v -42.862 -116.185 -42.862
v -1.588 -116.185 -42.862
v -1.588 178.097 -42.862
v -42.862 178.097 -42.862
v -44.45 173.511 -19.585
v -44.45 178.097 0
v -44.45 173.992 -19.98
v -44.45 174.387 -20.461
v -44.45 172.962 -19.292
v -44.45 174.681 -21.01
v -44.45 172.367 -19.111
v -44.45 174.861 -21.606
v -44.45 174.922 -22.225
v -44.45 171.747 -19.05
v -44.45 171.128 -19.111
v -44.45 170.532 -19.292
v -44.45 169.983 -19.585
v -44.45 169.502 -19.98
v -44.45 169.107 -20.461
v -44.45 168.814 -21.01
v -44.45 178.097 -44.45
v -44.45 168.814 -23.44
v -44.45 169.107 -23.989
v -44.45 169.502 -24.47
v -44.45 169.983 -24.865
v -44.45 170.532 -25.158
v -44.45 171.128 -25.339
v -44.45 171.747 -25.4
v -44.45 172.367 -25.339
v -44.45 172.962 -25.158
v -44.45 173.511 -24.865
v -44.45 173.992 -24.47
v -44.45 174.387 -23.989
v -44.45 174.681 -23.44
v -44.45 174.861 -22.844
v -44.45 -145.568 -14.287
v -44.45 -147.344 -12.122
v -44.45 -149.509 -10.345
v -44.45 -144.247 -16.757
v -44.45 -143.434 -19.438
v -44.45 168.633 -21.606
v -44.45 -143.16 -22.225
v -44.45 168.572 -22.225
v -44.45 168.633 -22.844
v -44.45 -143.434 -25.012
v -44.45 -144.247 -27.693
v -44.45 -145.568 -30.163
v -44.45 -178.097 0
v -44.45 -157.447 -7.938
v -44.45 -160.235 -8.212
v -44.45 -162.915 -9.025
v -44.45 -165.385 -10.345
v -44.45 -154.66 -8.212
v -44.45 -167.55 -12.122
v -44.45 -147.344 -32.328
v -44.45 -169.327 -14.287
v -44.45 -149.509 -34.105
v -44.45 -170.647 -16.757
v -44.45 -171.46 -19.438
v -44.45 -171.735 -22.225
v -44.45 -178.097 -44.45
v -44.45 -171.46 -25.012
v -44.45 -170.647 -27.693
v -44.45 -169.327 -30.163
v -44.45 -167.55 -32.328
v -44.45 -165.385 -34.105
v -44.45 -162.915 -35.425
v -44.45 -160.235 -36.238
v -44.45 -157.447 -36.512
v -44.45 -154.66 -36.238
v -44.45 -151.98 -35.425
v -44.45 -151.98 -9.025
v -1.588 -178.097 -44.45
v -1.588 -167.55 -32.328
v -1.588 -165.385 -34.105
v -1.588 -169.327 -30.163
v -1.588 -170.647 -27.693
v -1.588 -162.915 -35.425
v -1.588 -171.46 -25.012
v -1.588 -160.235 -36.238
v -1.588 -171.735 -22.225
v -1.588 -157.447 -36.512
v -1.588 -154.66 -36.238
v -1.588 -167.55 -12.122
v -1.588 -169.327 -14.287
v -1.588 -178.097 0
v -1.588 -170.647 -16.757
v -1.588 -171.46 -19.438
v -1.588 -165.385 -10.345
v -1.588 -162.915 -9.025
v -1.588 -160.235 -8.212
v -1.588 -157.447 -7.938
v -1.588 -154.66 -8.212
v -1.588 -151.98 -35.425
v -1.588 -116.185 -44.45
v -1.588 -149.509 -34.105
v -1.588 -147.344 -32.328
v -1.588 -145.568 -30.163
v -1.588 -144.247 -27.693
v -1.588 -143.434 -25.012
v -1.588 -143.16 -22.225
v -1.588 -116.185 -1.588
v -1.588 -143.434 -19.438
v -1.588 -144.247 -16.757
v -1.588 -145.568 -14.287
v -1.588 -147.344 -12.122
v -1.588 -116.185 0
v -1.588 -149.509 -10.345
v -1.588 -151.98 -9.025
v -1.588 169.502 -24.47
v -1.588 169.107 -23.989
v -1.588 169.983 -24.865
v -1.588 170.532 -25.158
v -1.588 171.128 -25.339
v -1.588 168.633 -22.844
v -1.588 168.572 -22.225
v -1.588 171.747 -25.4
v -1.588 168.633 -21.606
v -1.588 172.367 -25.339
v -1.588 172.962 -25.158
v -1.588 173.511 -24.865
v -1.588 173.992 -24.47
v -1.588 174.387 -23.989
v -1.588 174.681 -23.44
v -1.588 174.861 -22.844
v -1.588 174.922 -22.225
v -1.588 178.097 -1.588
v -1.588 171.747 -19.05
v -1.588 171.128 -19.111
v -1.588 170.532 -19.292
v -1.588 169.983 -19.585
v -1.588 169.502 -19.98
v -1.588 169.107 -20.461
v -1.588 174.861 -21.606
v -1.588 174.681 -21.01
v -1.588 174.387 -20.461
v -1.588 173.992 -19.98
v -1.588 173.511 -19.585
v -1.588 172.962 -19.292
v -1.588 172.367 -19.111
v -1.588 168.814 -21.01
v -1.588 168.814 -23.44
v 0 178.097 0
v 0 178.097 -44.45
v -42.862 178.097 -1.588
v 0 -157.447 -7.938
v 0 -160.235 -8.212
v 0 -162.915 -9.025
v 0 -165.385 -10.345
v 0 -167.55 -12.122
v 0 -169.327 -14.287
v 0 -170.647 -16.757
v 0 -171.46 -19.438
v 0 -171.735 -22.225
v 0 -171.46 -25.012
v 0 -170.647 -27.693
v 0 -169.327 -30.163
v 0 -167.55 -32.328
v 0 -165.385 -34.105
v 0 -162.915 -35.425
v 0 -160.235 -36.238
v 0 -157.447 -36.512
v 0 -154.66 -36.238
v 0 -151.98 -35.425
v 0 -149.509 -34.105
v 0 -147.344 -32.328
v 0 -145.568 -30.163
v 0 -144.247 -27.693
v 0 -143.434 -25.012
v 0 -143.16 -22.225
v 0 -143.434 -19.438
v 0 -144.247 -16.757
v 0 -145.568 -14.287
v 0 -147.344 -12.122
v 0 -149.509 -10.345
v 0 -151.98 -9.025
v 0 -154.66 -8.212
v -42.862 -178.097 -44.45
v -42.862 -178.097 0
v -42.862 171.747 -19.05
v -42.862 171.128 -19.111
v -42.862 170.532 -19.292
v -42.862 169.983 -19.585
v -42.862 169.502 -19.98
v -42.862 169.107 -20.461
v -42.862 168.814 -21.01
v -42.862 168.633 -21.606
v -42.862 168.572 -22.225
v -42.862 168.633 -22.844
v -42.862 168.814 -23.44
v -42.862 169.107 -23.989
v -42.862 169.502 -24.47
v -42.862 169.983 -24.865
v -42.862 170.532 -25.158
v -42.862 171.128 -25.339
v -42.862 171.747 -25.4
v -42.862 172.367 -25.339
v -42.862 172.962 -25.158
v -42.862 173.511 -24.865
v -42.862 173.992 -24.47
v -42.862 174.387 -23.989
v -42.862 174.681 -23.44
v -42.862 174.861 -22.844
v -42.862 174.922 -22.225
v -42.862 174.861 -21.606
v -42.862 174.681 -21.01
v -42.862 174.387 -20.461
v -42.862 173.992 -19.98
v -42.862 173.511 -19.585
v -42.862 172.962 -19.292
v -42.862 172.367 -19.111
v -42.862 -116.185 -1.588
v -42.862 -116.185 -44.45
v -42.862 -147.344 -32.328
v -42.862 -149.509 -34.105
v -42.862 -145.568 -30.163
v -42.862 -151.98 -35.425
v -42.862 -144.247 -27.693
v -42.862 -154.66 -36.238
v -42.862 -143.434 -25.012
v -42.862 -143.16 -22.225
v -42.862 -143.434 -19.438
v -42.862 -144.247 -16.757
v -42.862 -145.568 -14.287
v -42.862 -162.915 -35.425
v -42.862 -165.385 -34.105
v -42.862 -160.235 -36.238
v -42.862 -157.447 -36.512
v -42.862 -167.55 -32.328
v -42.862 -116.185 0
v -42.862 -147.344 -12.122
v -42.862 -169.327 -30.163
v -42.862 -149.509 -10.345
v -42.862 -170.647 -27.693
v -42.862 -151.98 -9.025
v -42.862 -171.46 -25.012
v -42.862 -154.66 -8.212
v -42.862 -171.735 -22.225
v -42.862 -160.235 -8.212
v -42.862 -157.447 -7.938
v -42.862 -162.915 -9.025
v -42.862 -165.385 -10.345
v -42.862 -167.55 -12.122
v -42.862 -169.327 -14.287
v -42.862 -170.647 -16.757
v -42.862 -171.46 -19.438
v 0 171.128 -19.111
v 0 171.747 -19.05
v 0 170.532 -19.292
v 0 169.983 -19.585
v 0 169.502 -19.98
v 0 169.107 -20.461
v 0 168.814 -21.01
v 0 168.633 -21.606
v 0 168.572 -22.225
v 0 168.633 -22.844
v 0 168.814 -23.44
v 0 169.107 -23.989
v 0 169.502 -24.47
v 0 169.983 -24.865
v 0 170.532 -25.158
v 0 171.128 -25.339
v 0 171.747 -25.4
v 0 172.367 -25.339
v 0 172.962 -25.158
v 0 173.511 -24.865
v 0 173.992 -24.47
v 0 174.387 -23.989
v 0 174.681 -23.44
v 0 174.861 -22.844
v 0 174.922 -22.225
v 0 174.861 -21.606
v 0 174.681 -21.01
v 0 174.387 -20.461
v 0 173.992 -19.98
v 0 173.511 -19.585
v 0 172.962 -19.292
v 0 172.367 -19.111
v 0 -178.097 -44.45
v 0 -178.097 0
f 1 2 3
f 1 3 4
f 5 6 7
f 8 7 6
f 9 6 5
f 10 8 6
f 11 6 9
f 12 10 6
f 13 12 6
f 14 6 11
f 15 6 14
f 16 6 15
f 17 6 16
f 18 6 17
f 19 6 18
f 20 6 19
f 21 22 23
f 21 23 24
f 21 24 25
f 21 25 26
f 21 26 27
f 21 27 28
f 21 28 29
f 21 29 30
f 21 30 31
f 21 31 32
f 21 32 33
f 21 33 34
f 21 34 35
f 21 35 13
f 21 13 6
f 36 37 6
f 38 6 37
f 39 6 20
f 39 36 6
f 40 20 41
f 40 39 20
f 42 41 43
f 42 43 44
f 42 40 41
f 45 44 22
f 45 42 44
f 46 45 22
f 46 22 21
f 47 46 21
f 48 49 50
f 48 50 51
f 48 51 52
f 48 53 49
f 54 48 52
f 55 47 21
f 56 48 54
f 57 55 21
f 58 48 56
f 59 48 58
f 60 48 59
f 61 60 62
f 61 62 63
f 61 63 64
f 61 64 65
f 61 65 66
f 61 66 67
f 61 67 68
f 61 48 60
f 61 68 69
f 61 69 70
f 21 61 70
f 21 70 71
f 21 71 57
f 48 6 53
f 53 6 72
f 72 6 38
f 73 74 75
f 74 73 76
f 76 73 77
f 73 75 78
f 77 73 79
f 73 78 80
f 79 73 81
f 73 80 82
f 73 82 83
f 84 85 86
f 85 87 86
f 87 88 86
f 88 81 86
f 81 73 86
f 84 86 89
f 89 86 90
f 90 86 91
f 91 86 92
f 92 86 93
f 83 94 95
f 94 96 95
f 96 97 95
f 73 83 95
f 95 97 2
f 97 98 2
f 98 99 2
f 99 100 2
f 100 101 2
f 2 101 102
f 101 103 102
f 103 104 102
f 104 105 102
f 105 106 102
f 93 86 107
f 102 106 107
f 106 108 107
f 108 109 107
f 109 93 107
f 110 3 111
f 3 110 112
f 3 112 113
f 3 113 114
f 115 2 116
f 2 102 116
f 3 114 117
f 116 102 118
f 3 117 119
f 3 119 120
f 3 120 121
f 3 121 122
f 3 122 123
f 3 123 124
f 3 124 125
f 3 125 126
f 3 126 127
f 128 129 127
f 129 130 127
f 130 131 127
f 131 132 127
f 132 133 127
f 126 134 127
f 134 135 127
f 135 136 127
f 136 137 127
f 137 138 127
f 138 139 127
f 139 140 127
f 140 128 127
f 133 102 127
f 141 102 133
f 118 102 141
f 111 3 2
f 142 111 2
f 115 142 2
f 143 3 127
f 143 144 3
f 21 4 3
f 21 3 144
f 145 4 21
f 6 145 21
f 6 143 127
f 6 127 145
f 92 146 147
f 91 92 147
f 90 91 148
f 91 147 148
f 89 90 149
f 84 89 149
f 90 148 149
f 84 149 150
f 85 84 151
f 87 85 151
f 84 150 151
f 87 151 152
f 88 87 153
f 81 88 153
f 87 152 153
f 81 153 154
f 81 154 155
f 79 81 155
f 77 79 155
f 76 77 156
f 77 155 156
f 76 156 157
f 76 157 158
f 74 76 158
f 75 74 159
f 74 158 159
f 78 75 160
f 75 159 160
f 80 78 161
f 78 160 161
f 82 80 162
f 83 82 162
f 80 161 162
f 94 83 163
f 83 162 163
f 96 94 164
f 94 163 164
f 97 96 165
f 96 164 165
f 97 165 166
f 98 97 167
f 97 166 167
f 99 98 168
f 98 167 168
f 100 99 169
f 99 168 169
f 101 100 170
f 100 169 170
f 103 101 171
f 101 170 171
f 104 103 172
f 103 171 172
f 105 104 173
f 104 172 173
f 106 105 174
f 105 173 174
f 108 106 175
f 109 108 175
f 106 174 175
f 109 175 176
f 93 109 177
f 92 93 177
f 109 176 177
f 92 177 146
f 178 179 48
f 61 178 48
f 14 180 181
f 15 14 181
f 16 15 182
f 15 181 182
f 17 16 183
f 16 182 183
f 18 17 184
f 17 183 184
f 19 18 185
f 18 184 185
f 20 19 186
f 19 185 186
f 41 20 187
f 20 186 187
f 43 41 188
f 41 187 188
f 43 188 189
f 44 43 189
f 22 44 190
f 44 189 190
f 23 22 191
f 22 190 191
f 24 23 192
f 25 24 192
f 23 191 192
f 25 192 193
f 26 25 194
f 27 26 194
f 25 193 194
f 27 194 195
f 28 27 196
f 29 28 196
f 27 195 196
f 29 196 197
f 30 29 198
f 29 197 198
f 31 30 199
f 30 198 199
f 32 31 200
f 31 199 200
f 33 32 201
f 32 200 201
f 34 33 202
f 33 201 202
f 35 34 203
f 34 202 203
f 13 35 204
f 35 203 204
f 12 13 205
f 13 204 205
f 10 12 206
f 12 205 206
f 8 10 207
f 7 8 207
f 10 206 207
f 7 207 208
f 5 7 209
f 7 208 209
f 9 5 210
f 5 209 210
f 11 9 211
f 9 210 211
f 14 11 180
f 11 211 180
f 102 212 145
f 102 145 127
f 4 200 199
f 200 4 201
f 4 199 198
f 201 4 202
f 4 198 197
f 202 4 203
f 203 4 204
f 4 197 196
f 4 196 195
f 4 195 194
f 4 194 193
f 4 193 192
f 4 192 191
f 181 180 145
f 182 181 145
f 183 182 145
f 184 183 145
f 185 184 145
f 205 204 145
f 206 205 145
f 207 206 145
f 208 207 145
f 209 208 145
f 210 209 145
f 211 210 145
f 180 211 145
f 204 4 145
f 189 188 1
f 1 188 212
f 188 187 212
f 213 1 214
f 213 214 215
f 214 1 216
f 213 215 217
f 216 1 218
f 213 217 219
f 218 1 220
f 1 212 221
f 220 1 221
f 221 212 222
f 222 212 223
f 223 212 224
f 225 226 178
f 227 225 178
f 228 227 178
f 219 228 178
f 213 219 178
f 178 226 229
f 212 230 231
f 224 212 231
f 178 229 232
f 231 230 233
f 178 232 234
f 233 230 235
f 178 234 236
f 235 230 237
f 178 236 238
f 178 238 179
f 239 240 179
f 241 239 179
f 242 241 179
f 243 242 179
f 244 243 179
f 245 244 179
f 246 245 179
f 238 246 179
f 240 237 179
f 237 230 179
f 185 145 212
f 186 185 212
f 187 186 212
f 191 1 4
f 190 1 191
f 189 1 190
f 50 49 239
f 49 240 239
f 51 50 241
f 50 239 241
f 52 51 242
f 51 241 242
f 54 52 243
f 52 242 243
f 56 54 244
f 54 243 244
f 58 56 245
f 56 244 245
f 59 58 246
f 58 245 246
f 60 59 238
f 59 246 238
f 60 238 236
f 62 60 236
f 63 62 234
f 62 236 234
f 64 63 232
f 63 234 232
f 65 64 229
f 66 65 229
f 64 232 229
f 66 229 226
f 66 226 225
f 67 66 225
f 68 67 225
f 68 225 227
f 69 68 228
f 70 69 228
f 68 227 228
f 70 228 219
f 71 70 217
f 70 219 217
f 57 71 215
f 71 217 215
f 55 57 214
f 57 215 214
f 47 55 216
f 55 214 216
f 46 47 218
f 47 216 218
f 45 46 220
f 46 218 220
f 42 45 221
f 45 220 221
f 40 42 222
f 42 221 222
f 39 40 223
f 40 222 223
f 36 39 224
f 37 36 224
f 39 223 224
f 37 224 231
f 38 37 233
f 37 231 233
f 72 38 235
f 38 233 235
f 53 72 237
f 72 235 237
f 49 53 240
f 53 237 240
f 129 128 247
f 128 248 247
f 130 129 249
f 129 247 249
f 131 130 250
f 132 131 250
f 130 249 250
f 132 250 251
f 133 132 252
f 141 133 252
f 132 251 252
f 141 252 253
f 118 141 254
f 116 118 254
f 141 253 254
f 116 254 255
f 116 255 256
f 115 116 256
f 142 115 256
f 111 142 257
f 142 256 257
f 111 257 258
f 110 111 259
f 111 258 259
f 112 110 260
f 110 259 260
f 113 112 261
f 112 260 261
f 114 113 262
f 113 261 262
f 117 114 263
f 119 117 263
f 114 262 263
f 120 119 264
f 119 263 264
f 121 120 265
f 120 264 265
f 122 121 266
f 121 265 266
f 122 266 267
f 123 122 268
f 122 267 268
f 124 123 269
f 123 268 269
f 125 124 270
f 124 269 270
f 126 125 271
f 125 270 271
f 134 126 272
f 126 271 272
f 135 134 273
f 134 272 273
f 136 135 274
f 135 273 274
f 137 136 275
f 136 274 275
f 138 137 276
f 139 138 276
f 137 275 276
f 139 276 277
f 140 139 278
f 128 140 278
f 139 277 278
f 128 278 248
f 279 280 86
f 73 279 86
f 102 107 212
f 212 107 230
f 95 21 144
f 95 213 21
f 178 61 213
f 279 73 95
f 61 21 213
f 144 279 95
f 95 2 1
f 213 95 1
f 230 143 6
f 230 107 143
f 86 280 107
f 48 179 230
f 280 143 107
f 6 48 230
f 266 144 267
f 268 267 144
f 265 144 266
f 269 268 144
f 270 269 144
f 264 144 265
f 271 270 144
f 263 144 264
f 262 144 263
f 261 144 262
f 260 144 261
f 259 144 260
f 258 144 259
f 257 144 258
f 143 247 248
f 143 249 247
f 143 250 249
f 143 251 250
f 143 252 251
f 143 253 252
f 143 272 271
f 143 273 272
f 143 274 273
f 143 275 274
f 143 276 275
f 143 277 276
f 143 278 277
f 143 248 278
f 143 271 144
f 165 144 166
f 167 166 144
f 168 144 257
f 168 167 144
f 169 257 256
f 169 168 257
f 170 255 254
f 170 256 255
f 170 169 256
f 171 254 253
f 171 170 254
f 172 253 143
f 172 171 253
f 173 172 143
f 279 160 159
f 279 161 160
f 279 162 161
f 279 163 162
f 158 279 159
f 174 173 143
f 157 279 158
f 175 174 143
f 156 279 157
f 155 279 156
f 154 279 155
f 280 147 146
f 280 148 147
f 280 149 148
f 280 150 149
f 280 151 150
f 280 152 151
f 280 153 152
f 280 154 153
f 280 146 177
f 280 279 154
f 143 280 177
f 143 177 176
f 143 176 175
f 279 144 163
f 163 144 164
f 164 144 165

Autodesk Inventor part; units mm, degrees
ref_plane "YZ Plane" through (0, 0, 0) normal (1, 0, 0) x (0, 1, 0)
ref_plane "XZ Plane" through (0, 0, 0) normal (0, 1, 0) x (-1, 0, 0)
ref_plane "XY Plane" through (0, 0, 0) normal (0, 0, 1) x (1, 0, 0)
sketch "Sketch1" plane through (0, 0, 0) normal (0, 1, 0) x (-1, 0, 0)
  line L0 (0, 0) -> (44.45, 0)
  line L1 (44.45, 0) -> (44.45, -44.45)
  line L2 (44.45, -44.45) -> (0, -44.45)
  line L3 (0, -44.45) -> (0, 0)
  line L4 (42.8625, -1.5875) -> (1.5875, -1.5875)
  line L5 (1.5875, -1.5875) -> (1.5875, -42.8625)
  line L6 (1.5875, -42.8625) -> (42.8625, -42.8625)
  line L7 (42.8625, -42.8625) -> (42.8625, -1.5875)
  dimension "d0" = 44.45
  dimension "d2" = 1.5875
extrude "Extrusion1" add sketch "Sketch1" along normal mid plane 356.1949
ref_plane "Work Plane1" through (-22.225, -178.0974, -44.45) normal (1, 0, 0) x (0, 0, -1)
sketch "Sketch2" plane through (-44.45, -178.0974, 0) normal (-1, 0, 0) x (0, 0, 1)
  line L0 (-44.45, 356.1949) -> (0, 356.1949) projected
  line L1 (0, 356.1949) -> (0, 0) projected
  line L2 (-44.45, 356.1949) -> (-44.45, 0) projected
  point P0 (0, 178.0974)
  point P1 (-22.225, 349.8449)
  dimension "d5" = 6.35
  dimension "d17" = 22.225
hole "Hole1" at (-44.45, 171.7474, -22.225) direction (1, 0, 0) diameter 6.35 end through all
ref_plane "Work Plane2" through (-44.45, 178.0974, -22.225) normal (0, 0, 1) x (1, 0, 0)
sketch "Sketch3" plane through (-44.45, 178.0974, 0) normal (0, 0, 1) x (1, 0, 0)
  line L0 (44.45, -356.1949) -> (44.45, 0) projected
  line L1 (0, 0) -> (44.45, 0) projected
  line L2 (0, 0) -> (0, -356.1949) projected
  line L3 (44.45, -356.1949) -> (0, -356.1949) projected
  line L4 (1.5875, 0) -> (1.5875, -356.1949) projected
  line L5 (42.8625, -356.1949) -> (42.8625, 0) projected
  line L6 (1.5875, -356.1949) -> (42.8625, -356.1949) projected
  line L7 (1.5875, -356.1949) -> (42.8625, -356.1949)
  line L8 (42.8625, -356.1949) -> (42.8625, -294.2824)
  line L9 (42.8625, -294.2824) -> (1.5875, -294.2824)
  line L10 (1.5875, -294.2824) -> (1.5875, -356.1949)
  point P0 (44.45, -178.0974)
  dimension "d14" = 61.9125
extrude "Extrusion2" cut sketch "Sketch3" against normal through all contours L3 L4 L9 L5
sketch "Sketch4" plane through (-44.45, -178.0974, 0) normal (-1, 0, 0) x (0, 0, 1)
  line L0 (-44.45, 356.1949) -> (-44.45, 0) projected
  line L1 (0, 0) -> (-44.45, 0) projected
  point P0 (0, 178.0974)
  point P1 (-22.225, 20.6502)
  dimension "d18" = 22.225
  dimension "d19" = 20.6502
hole "Hole2" at (-44.45, -157.4472, -22.225) direction (1, 0, 0) diameter 28.575 end through all
properties part number "CAR_025_KickerBar" material "Aluminum 6061"
